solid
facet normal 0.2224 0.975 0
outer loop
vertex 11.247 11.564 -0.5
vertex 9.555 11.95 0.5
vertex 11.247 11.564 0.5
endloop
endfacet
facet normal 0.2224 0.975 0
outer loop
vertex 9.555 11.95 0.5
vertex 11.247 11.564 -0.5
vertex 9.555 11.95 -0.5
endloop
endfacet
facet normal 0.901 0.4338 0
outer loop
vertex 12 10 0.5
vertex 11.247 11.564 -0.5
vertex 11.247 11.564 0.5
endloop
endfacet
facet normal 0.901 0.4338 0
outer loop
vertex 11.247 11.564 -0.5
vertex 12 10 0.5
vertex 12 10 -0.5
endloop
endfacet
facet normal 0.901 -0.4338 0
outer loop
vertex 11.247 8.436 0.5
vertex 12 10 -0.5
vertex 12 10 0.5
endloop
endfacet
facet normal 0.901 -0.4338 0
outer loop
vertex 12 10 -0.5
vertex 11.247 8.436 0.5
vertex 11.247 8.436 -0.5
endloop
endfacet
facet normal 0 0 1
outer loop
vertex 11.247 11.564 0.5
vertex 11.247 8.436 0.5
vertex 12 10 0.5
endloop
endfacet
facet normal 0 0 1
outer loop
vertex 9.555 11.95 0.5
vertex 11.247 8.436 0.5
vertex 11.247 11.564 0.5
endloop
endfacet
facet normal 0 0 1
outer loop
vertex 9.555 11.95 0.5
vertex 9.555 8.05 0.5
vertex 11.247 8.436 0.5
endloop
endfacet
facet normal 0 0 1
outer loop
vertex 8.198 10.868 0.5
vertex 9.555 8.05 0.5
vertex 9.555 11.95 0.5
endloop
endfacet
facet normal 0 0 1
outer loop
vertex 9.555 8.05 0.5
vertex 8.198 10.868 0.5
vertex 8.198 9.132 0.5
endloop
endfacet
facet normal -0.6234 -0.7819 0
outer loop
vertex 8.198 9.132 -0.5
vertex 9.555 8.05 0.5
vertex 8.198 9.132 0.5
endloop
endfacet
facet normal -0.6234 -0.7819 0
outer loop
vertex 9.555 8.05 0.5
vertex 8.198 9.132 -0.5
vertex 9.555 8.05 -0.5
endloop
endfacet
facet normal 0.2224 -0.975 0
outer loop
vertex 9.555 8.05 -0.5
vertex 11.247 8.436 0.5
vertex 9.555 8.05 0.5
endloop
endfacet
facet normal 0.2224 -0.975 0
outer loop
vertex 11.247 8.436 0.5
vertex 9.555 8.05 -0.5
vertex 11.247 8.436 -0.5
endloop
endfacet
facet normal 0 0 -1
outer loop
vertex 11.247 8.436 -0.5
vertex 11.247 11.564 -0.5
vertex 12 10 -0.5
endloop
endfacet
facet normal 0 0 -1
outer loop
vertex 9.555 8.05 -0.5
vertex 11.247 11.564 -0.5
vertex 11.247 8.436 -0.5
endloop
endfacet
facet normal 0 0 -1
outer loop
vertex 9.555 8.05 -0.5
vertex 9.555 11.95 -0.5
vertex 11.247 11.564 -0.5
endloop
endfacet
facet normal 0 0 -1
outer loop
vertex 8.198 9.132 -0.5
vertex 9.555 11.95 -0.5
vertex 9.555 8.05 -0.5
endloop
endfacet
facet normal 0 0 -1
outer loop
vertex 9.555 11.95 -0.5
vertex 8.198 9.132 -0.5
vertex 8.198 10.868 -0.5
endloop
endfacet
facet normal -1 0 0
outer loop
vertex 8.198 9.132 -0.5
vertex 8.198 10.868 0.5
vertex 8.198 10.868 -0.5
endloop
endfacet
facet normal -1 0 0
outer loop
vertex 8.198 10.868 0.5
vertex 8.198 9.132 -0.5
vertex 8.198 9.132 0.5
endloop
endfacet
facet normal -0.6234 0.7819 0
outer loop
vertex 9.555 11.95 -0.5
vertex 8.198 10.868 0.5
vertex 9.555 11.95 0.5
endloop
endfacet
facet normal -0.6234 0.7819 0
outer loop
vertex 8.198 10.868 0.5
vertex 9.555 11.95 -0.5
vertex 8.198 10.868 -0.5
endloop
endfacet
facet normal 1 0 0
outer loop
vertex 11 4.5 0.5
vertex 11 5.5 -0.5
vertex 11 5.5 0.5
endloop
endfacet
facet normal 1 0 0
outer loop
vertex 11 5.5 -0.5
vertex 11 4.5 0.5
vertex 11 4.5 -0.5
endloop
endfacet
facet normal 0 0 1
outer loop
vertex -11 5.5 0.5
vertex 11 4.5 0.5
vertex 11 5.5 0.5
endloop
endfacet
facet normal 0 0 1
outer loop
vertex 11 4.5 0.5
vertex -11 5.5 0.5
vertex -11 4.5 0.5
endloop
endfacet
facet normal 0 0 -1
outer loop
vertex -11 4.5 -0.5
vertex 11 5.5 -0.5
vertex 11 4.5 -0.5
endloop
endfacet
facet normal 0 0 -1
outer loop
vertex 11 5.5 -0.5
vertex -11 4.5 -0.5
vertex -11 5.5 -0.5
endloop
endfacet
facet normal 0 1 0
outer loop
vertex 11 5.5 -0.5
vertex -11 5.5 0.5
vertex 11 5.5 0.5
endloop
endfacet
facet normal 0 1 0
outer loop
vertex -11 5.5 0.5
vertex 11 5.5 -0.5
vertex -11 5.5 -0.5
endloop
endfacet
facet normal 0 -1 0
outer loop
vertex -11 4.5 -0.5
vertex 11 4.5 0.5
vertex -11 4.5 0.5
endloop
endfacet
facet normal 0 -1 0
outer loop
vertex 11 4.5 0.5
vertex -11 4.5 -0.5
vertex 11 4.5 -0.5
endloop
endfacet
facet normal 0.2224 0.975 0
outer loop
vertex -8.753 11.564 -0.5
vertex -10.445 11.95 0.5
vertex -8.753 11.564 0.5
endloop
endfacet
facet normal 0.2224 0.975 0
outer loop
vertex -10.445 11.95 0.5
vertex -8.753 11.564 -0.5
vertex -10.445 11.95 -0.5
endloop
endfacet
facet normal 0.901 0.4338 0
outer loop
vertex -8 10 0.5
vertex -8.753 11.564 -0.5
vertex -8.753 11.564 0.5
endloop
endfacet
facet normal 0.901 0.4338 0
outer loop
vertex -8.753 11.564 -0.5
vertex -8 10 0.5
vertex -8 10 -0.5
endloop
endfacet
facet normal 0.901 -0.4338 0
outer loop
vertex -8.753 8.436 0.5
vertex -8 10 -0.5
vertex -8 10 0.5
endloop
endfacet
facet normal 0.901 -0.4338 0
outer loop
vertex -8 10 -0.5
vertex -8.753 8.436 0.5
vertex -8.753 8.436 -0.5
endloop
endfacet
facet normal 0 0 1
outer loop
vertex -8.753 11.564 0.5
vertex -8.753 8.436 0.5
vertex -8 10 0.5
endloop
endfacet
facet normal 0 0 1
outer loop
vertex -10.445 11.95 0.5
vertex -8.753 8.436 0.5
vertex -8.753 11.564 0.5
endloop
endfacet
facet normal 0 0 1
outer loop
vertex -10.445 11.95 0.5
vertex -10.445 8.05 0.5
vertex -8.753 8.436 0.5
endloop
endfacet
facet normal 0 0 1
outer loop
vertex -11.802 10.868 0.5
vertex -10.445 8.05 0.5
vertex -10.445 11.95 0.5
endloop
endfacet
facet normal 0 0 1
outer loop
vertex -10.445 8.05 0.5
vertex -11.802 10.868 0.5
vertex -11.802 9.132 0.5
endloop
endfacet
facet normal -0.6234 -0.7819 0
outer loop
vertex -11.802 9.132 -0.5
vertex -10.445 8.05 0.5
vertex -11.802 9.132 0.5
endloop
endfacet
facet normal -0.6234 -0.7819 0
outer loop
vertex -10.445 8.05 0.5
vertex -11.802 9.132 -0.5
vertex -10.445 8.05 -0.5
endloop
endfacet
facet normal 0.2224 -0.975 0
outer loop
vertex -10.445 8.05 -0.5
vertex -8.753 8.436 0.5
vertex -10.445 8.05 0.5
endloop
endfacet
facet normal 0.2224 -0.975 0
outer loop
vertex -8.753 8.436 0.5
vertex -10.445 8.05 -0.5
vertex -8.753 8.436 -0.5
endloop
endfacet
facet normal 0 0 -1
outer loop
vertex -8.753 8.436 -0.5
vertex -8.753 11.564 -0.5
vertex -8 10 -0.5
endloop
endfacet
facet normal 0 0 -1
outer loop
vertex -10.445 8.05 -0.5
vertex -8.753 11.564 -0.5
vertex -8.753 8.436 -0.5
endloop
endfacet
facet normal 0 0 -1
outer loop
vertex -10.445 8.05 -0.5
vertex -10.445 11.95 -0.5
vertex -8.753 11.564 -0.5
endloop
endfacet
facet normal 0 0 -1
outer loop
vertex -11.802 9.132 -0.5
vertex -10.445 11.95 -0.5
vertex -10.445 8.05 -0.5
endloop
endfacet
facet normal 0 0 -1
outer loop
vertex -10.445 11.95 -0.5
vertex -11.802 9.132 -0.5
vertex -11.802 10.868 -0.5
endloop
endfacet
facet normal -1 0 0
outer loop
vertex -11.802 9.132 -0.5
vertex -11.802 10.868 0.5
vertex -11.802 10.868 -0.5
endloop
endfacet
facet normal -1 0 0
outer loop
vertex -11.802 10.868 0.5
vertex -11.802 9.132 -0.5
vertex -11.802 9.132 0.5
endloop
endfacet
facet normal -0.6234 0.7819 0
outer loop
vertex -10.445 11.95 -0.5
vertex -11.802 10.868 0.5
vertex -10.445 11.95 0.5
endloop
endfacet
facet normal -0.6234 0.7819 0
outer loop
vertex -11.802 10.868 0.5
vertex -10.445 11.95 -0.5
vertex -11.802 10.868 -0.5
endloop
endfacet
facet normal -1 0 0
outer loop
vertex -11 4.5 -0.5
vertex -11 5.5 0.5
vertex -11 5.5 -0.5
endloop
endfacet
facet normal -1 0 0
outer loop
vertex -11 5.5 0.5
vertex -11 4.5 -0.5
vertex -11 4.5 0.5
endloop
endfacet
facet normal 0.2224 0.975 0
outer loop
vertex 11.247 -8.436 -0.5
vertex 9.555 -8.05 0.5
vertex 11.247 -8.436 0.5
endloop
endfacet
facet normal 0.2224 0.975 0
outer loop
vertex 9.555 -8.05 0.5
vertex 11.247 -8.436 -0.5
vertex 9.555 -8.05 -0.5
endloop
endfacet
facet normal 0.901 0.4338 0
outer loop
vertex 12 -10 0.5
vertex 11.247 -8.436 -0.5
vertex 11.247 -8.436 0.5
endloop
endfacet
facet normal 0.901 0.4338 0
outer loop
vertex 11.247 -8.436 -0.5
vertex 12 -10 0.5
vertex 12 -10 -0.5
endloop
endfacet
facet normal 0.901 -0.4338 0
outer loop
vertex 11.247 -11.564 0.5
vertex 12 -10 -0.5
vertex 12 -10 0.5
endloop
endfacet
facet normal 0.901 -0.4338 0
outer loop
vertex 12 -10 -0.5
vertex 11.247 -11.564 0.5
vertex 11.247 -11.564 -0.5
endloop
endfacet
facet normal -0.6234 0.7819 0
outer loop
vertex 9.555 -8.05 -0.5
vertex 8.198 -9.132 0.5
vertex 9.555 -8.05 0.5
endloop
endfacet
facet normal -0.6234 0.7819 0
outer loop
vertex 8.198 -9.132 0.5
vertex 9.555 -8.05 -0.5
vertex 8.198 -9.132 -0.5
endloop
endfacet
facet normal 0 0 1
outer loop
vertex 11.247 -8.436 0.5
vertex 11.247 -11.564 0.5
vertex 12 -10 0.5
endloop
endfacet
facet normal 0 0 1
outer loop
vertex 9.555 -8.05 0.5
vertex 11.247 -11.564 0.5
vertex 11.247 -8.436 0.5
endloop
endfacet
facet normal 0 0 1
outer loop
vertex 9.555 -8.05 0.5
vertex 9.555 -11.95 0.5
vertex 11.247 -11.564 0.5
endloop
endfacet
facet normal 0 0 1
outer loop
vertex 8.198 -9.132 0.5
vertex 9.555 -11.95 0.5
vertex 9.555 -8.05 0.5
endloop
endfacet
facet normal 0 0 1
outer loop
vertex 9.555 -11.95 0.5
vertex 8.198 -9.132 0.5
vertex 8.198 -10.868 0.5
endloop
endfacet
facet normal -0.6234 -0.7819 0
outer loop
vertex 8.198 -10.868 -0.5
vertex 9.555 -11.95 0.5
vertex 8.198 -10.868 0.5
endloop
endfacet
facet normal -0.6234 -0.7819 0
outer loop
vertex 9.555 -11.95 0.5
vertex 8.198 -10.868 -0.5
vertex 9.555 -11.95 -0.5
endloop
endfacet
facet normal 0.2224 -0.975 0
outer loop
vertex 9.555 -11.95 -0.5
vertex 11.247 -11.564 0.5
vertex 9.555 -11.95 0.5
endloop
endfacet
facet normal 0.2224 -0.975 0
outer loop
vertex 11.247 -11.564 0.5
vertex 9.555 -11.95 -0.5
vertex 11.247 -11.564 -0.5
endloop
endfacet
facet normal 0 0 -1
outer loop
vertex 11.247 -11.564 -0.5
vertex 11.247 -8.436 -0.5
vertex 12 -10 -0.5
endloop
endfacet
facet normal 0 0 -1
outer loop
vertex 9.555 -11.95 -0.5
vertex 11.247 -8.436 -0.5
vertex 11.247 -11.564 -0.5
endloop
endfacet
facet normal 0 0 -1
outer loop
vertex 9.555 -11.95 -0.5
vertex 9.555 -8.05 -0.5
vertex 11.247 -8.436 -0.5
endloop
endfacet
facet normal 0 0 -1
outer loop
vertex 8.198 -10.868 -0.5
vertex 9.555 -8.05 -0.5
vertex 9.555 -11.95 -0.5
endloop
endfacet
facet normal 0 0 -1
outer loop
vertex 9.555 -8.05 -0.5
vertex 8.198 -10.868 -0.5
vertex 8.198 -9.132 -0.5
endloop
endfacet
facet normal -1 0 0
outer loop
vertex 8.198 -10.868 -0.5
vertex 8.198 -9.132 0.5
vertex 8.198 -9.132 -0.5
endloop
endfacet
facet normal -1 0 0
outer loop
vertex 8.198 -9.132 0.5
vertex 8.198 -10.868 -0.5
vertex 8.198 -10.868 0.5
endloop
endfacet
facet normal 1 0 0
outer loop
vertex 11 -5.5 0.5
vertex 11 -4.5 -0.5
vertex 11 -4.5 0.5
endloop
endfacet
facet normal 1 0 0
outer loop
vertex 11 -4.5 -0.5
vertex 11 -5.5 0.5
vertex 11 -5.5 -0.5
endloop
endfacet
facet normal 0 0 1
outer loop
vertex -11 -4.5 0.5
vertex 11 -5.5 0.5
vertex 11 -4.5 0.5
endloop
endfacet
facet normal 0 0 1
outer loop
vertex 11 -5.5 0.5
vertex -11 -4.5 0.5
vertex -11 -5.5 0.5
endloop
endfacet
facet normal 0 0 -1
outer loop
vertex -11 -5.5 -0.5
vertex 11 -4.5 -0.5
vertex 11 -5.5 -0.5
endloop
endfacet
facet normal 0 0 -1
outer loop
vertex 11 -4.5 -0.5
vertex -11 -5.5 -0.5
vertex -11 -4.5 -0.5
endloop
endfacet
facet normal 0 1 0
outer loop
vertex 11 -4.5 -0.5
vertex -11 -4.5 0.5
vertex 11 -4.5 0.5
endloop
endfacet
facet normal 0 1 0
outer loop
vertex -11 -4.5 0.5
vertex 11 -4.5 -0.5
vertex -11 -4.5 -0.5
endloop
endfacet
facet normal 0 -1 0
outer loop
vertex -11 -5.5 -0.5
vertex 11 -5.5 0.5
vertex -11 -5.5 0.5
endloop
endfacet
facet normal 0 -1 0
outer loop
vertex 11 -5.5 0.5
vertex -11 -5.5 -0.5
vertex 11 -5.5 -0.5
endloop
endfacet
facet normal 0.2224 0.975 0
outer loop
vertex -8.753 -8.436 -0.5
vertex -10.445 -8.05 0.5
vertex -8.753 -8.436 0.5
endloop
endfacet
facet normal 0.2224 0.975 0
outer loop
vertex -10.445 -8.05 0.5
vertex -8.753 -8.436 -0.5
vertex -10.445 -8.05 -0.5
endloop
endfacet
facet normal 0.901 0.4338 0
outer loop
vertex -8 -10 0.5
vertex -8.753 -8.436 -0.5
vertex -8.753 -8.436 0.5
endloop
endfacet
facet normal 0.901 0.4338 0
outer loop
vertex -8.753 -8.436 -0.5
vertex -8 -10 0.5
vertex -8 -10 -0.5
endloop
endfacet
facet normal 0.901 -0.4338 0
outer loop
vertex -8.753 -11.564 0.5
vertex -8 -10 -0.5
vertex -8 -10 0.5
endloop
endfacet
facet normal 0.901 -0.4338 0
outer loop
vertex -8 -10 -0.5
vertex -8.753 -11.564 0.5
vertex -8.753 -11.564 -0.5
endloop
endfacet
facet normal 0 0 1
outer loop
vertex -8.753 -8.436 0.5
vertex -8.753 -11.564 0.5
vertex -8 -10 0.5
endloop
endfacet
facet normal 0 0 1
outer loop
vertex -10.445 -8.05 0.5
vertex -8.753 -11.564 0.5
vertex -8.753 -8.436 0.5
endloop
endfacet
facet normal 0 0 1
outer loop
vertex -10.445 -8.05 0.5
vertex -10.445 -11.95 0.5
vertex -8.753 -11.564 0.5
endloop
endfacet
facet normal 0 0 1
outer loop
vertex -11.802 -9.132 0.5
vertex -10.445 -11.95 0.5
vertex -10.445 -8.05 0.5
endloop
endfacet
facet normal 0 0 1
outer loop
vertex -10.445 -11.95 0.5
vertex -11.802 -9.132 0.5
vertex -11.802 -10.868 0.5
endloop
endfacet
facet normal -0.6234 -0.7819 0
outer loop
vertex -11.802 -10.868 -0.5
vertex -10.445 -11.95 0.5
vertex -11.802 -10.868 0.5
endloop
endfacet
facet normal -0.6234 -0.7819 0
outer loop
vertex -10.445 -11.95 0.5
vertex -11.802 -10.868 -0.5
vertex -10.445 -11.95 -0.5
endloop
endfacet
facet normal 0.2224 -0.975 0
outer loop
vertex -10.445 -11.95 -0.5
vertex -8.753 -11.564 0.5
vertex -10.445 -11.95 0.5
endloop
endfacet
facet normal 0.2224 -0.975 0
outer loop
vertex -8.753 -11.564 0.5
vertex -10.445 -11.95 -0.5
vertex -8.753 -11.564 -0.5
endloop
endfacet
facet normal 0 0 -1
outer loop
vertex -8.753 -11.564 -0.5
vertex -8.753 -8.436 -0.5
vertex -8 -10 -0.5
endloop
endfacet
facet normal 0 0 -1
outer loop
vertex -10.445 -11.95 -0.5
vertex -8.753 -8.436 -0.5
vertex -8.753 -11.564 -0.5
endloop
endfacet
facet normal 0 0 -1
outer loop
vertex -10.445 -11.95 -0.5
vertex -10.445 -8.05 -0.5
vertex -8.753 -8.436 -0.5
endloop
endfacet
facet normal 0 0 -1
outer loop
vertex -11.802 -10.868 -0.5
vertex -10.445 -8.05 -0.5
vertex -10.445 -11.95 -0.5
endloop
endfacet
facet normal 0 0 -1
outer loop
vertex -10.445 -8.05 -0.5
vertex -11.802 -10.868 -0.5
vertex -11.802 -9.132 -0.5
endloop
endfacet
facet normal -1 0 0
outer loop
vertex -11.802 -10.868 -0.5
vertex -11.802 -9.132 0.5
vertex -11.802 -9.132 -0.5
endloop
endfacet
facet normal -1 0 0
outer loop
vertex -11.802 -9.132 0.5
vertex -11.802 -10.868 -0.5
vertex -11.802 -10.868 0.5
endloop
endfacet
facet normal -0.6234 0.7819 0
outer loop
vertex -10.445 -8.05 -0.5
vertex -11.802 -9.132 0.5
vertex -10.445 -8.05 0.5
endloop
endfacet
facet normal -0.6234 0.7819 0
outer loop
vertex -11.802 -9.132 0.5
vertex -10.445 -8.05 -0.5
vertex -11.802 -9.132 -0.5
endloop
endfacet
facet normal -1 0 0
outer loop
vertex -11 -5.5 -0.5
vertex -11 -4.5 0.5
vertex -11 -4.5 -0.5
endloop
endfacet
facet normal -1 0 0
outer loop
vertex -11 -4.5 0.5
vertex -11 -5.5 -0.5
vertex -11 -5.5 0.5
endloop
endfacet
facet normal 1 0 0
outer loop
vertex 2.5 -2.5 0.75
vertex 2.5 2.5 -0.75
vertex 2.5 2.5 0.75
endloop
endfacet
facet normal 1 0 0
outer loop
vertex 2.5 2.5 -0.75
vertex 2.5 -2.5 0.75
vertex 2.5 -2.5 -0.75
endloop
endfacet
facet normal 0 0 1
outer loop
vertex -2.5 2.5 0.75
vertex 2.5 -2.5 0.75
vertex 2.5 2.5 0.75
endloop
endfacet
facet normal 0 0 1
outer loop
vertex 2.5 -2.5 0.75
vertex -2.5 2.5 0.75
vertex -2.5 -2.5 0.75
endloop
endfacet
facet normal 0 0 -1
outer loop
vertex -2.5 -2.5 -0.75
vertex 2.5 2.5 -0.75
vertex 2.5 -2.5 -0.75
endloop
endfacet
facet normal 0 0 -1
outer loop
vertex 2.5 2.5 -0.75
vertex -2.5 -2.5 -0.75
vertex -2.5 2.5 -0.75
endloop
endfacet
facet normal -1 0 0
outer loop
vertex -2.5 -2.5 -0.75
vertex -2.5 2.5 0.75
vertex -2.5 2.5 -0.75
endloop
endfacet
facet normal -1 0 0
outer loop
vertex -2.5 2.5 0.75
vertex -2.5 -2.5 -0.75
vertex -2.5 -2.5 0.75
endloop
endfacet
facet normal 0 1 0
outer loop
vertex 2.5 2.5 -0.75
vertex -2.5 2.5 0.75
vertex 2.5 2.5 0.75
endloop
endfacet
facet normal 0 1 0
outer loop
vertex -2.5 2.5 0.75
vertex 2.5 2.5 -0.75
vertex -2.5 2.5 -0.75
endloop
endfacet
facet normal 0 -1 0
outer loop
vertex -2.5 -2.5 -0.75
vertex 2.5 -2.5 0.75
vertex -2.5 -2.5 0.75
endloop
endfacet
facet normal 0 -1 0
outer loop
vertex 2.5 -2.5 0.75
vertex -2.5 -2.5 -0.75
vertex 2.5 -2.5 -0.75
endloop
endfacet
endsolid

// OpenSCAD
module motor_arm(x=10, y=10) {
  union() {
    translate([x,y,0])
      cylinder(h=1, r=2, center=true);
    translate([x/2,y/2,0])
      cube([12,1,1], center=true);
  }
}

module modular_drone() {
  union() {
    cube([5,5,1.5], center=true);
    motor_arm(10,10);
    motor_arm(-10,10);
    motor_arm(10,-10);
    motor_arm(-10,-10);
  }
}

modular_drone();
